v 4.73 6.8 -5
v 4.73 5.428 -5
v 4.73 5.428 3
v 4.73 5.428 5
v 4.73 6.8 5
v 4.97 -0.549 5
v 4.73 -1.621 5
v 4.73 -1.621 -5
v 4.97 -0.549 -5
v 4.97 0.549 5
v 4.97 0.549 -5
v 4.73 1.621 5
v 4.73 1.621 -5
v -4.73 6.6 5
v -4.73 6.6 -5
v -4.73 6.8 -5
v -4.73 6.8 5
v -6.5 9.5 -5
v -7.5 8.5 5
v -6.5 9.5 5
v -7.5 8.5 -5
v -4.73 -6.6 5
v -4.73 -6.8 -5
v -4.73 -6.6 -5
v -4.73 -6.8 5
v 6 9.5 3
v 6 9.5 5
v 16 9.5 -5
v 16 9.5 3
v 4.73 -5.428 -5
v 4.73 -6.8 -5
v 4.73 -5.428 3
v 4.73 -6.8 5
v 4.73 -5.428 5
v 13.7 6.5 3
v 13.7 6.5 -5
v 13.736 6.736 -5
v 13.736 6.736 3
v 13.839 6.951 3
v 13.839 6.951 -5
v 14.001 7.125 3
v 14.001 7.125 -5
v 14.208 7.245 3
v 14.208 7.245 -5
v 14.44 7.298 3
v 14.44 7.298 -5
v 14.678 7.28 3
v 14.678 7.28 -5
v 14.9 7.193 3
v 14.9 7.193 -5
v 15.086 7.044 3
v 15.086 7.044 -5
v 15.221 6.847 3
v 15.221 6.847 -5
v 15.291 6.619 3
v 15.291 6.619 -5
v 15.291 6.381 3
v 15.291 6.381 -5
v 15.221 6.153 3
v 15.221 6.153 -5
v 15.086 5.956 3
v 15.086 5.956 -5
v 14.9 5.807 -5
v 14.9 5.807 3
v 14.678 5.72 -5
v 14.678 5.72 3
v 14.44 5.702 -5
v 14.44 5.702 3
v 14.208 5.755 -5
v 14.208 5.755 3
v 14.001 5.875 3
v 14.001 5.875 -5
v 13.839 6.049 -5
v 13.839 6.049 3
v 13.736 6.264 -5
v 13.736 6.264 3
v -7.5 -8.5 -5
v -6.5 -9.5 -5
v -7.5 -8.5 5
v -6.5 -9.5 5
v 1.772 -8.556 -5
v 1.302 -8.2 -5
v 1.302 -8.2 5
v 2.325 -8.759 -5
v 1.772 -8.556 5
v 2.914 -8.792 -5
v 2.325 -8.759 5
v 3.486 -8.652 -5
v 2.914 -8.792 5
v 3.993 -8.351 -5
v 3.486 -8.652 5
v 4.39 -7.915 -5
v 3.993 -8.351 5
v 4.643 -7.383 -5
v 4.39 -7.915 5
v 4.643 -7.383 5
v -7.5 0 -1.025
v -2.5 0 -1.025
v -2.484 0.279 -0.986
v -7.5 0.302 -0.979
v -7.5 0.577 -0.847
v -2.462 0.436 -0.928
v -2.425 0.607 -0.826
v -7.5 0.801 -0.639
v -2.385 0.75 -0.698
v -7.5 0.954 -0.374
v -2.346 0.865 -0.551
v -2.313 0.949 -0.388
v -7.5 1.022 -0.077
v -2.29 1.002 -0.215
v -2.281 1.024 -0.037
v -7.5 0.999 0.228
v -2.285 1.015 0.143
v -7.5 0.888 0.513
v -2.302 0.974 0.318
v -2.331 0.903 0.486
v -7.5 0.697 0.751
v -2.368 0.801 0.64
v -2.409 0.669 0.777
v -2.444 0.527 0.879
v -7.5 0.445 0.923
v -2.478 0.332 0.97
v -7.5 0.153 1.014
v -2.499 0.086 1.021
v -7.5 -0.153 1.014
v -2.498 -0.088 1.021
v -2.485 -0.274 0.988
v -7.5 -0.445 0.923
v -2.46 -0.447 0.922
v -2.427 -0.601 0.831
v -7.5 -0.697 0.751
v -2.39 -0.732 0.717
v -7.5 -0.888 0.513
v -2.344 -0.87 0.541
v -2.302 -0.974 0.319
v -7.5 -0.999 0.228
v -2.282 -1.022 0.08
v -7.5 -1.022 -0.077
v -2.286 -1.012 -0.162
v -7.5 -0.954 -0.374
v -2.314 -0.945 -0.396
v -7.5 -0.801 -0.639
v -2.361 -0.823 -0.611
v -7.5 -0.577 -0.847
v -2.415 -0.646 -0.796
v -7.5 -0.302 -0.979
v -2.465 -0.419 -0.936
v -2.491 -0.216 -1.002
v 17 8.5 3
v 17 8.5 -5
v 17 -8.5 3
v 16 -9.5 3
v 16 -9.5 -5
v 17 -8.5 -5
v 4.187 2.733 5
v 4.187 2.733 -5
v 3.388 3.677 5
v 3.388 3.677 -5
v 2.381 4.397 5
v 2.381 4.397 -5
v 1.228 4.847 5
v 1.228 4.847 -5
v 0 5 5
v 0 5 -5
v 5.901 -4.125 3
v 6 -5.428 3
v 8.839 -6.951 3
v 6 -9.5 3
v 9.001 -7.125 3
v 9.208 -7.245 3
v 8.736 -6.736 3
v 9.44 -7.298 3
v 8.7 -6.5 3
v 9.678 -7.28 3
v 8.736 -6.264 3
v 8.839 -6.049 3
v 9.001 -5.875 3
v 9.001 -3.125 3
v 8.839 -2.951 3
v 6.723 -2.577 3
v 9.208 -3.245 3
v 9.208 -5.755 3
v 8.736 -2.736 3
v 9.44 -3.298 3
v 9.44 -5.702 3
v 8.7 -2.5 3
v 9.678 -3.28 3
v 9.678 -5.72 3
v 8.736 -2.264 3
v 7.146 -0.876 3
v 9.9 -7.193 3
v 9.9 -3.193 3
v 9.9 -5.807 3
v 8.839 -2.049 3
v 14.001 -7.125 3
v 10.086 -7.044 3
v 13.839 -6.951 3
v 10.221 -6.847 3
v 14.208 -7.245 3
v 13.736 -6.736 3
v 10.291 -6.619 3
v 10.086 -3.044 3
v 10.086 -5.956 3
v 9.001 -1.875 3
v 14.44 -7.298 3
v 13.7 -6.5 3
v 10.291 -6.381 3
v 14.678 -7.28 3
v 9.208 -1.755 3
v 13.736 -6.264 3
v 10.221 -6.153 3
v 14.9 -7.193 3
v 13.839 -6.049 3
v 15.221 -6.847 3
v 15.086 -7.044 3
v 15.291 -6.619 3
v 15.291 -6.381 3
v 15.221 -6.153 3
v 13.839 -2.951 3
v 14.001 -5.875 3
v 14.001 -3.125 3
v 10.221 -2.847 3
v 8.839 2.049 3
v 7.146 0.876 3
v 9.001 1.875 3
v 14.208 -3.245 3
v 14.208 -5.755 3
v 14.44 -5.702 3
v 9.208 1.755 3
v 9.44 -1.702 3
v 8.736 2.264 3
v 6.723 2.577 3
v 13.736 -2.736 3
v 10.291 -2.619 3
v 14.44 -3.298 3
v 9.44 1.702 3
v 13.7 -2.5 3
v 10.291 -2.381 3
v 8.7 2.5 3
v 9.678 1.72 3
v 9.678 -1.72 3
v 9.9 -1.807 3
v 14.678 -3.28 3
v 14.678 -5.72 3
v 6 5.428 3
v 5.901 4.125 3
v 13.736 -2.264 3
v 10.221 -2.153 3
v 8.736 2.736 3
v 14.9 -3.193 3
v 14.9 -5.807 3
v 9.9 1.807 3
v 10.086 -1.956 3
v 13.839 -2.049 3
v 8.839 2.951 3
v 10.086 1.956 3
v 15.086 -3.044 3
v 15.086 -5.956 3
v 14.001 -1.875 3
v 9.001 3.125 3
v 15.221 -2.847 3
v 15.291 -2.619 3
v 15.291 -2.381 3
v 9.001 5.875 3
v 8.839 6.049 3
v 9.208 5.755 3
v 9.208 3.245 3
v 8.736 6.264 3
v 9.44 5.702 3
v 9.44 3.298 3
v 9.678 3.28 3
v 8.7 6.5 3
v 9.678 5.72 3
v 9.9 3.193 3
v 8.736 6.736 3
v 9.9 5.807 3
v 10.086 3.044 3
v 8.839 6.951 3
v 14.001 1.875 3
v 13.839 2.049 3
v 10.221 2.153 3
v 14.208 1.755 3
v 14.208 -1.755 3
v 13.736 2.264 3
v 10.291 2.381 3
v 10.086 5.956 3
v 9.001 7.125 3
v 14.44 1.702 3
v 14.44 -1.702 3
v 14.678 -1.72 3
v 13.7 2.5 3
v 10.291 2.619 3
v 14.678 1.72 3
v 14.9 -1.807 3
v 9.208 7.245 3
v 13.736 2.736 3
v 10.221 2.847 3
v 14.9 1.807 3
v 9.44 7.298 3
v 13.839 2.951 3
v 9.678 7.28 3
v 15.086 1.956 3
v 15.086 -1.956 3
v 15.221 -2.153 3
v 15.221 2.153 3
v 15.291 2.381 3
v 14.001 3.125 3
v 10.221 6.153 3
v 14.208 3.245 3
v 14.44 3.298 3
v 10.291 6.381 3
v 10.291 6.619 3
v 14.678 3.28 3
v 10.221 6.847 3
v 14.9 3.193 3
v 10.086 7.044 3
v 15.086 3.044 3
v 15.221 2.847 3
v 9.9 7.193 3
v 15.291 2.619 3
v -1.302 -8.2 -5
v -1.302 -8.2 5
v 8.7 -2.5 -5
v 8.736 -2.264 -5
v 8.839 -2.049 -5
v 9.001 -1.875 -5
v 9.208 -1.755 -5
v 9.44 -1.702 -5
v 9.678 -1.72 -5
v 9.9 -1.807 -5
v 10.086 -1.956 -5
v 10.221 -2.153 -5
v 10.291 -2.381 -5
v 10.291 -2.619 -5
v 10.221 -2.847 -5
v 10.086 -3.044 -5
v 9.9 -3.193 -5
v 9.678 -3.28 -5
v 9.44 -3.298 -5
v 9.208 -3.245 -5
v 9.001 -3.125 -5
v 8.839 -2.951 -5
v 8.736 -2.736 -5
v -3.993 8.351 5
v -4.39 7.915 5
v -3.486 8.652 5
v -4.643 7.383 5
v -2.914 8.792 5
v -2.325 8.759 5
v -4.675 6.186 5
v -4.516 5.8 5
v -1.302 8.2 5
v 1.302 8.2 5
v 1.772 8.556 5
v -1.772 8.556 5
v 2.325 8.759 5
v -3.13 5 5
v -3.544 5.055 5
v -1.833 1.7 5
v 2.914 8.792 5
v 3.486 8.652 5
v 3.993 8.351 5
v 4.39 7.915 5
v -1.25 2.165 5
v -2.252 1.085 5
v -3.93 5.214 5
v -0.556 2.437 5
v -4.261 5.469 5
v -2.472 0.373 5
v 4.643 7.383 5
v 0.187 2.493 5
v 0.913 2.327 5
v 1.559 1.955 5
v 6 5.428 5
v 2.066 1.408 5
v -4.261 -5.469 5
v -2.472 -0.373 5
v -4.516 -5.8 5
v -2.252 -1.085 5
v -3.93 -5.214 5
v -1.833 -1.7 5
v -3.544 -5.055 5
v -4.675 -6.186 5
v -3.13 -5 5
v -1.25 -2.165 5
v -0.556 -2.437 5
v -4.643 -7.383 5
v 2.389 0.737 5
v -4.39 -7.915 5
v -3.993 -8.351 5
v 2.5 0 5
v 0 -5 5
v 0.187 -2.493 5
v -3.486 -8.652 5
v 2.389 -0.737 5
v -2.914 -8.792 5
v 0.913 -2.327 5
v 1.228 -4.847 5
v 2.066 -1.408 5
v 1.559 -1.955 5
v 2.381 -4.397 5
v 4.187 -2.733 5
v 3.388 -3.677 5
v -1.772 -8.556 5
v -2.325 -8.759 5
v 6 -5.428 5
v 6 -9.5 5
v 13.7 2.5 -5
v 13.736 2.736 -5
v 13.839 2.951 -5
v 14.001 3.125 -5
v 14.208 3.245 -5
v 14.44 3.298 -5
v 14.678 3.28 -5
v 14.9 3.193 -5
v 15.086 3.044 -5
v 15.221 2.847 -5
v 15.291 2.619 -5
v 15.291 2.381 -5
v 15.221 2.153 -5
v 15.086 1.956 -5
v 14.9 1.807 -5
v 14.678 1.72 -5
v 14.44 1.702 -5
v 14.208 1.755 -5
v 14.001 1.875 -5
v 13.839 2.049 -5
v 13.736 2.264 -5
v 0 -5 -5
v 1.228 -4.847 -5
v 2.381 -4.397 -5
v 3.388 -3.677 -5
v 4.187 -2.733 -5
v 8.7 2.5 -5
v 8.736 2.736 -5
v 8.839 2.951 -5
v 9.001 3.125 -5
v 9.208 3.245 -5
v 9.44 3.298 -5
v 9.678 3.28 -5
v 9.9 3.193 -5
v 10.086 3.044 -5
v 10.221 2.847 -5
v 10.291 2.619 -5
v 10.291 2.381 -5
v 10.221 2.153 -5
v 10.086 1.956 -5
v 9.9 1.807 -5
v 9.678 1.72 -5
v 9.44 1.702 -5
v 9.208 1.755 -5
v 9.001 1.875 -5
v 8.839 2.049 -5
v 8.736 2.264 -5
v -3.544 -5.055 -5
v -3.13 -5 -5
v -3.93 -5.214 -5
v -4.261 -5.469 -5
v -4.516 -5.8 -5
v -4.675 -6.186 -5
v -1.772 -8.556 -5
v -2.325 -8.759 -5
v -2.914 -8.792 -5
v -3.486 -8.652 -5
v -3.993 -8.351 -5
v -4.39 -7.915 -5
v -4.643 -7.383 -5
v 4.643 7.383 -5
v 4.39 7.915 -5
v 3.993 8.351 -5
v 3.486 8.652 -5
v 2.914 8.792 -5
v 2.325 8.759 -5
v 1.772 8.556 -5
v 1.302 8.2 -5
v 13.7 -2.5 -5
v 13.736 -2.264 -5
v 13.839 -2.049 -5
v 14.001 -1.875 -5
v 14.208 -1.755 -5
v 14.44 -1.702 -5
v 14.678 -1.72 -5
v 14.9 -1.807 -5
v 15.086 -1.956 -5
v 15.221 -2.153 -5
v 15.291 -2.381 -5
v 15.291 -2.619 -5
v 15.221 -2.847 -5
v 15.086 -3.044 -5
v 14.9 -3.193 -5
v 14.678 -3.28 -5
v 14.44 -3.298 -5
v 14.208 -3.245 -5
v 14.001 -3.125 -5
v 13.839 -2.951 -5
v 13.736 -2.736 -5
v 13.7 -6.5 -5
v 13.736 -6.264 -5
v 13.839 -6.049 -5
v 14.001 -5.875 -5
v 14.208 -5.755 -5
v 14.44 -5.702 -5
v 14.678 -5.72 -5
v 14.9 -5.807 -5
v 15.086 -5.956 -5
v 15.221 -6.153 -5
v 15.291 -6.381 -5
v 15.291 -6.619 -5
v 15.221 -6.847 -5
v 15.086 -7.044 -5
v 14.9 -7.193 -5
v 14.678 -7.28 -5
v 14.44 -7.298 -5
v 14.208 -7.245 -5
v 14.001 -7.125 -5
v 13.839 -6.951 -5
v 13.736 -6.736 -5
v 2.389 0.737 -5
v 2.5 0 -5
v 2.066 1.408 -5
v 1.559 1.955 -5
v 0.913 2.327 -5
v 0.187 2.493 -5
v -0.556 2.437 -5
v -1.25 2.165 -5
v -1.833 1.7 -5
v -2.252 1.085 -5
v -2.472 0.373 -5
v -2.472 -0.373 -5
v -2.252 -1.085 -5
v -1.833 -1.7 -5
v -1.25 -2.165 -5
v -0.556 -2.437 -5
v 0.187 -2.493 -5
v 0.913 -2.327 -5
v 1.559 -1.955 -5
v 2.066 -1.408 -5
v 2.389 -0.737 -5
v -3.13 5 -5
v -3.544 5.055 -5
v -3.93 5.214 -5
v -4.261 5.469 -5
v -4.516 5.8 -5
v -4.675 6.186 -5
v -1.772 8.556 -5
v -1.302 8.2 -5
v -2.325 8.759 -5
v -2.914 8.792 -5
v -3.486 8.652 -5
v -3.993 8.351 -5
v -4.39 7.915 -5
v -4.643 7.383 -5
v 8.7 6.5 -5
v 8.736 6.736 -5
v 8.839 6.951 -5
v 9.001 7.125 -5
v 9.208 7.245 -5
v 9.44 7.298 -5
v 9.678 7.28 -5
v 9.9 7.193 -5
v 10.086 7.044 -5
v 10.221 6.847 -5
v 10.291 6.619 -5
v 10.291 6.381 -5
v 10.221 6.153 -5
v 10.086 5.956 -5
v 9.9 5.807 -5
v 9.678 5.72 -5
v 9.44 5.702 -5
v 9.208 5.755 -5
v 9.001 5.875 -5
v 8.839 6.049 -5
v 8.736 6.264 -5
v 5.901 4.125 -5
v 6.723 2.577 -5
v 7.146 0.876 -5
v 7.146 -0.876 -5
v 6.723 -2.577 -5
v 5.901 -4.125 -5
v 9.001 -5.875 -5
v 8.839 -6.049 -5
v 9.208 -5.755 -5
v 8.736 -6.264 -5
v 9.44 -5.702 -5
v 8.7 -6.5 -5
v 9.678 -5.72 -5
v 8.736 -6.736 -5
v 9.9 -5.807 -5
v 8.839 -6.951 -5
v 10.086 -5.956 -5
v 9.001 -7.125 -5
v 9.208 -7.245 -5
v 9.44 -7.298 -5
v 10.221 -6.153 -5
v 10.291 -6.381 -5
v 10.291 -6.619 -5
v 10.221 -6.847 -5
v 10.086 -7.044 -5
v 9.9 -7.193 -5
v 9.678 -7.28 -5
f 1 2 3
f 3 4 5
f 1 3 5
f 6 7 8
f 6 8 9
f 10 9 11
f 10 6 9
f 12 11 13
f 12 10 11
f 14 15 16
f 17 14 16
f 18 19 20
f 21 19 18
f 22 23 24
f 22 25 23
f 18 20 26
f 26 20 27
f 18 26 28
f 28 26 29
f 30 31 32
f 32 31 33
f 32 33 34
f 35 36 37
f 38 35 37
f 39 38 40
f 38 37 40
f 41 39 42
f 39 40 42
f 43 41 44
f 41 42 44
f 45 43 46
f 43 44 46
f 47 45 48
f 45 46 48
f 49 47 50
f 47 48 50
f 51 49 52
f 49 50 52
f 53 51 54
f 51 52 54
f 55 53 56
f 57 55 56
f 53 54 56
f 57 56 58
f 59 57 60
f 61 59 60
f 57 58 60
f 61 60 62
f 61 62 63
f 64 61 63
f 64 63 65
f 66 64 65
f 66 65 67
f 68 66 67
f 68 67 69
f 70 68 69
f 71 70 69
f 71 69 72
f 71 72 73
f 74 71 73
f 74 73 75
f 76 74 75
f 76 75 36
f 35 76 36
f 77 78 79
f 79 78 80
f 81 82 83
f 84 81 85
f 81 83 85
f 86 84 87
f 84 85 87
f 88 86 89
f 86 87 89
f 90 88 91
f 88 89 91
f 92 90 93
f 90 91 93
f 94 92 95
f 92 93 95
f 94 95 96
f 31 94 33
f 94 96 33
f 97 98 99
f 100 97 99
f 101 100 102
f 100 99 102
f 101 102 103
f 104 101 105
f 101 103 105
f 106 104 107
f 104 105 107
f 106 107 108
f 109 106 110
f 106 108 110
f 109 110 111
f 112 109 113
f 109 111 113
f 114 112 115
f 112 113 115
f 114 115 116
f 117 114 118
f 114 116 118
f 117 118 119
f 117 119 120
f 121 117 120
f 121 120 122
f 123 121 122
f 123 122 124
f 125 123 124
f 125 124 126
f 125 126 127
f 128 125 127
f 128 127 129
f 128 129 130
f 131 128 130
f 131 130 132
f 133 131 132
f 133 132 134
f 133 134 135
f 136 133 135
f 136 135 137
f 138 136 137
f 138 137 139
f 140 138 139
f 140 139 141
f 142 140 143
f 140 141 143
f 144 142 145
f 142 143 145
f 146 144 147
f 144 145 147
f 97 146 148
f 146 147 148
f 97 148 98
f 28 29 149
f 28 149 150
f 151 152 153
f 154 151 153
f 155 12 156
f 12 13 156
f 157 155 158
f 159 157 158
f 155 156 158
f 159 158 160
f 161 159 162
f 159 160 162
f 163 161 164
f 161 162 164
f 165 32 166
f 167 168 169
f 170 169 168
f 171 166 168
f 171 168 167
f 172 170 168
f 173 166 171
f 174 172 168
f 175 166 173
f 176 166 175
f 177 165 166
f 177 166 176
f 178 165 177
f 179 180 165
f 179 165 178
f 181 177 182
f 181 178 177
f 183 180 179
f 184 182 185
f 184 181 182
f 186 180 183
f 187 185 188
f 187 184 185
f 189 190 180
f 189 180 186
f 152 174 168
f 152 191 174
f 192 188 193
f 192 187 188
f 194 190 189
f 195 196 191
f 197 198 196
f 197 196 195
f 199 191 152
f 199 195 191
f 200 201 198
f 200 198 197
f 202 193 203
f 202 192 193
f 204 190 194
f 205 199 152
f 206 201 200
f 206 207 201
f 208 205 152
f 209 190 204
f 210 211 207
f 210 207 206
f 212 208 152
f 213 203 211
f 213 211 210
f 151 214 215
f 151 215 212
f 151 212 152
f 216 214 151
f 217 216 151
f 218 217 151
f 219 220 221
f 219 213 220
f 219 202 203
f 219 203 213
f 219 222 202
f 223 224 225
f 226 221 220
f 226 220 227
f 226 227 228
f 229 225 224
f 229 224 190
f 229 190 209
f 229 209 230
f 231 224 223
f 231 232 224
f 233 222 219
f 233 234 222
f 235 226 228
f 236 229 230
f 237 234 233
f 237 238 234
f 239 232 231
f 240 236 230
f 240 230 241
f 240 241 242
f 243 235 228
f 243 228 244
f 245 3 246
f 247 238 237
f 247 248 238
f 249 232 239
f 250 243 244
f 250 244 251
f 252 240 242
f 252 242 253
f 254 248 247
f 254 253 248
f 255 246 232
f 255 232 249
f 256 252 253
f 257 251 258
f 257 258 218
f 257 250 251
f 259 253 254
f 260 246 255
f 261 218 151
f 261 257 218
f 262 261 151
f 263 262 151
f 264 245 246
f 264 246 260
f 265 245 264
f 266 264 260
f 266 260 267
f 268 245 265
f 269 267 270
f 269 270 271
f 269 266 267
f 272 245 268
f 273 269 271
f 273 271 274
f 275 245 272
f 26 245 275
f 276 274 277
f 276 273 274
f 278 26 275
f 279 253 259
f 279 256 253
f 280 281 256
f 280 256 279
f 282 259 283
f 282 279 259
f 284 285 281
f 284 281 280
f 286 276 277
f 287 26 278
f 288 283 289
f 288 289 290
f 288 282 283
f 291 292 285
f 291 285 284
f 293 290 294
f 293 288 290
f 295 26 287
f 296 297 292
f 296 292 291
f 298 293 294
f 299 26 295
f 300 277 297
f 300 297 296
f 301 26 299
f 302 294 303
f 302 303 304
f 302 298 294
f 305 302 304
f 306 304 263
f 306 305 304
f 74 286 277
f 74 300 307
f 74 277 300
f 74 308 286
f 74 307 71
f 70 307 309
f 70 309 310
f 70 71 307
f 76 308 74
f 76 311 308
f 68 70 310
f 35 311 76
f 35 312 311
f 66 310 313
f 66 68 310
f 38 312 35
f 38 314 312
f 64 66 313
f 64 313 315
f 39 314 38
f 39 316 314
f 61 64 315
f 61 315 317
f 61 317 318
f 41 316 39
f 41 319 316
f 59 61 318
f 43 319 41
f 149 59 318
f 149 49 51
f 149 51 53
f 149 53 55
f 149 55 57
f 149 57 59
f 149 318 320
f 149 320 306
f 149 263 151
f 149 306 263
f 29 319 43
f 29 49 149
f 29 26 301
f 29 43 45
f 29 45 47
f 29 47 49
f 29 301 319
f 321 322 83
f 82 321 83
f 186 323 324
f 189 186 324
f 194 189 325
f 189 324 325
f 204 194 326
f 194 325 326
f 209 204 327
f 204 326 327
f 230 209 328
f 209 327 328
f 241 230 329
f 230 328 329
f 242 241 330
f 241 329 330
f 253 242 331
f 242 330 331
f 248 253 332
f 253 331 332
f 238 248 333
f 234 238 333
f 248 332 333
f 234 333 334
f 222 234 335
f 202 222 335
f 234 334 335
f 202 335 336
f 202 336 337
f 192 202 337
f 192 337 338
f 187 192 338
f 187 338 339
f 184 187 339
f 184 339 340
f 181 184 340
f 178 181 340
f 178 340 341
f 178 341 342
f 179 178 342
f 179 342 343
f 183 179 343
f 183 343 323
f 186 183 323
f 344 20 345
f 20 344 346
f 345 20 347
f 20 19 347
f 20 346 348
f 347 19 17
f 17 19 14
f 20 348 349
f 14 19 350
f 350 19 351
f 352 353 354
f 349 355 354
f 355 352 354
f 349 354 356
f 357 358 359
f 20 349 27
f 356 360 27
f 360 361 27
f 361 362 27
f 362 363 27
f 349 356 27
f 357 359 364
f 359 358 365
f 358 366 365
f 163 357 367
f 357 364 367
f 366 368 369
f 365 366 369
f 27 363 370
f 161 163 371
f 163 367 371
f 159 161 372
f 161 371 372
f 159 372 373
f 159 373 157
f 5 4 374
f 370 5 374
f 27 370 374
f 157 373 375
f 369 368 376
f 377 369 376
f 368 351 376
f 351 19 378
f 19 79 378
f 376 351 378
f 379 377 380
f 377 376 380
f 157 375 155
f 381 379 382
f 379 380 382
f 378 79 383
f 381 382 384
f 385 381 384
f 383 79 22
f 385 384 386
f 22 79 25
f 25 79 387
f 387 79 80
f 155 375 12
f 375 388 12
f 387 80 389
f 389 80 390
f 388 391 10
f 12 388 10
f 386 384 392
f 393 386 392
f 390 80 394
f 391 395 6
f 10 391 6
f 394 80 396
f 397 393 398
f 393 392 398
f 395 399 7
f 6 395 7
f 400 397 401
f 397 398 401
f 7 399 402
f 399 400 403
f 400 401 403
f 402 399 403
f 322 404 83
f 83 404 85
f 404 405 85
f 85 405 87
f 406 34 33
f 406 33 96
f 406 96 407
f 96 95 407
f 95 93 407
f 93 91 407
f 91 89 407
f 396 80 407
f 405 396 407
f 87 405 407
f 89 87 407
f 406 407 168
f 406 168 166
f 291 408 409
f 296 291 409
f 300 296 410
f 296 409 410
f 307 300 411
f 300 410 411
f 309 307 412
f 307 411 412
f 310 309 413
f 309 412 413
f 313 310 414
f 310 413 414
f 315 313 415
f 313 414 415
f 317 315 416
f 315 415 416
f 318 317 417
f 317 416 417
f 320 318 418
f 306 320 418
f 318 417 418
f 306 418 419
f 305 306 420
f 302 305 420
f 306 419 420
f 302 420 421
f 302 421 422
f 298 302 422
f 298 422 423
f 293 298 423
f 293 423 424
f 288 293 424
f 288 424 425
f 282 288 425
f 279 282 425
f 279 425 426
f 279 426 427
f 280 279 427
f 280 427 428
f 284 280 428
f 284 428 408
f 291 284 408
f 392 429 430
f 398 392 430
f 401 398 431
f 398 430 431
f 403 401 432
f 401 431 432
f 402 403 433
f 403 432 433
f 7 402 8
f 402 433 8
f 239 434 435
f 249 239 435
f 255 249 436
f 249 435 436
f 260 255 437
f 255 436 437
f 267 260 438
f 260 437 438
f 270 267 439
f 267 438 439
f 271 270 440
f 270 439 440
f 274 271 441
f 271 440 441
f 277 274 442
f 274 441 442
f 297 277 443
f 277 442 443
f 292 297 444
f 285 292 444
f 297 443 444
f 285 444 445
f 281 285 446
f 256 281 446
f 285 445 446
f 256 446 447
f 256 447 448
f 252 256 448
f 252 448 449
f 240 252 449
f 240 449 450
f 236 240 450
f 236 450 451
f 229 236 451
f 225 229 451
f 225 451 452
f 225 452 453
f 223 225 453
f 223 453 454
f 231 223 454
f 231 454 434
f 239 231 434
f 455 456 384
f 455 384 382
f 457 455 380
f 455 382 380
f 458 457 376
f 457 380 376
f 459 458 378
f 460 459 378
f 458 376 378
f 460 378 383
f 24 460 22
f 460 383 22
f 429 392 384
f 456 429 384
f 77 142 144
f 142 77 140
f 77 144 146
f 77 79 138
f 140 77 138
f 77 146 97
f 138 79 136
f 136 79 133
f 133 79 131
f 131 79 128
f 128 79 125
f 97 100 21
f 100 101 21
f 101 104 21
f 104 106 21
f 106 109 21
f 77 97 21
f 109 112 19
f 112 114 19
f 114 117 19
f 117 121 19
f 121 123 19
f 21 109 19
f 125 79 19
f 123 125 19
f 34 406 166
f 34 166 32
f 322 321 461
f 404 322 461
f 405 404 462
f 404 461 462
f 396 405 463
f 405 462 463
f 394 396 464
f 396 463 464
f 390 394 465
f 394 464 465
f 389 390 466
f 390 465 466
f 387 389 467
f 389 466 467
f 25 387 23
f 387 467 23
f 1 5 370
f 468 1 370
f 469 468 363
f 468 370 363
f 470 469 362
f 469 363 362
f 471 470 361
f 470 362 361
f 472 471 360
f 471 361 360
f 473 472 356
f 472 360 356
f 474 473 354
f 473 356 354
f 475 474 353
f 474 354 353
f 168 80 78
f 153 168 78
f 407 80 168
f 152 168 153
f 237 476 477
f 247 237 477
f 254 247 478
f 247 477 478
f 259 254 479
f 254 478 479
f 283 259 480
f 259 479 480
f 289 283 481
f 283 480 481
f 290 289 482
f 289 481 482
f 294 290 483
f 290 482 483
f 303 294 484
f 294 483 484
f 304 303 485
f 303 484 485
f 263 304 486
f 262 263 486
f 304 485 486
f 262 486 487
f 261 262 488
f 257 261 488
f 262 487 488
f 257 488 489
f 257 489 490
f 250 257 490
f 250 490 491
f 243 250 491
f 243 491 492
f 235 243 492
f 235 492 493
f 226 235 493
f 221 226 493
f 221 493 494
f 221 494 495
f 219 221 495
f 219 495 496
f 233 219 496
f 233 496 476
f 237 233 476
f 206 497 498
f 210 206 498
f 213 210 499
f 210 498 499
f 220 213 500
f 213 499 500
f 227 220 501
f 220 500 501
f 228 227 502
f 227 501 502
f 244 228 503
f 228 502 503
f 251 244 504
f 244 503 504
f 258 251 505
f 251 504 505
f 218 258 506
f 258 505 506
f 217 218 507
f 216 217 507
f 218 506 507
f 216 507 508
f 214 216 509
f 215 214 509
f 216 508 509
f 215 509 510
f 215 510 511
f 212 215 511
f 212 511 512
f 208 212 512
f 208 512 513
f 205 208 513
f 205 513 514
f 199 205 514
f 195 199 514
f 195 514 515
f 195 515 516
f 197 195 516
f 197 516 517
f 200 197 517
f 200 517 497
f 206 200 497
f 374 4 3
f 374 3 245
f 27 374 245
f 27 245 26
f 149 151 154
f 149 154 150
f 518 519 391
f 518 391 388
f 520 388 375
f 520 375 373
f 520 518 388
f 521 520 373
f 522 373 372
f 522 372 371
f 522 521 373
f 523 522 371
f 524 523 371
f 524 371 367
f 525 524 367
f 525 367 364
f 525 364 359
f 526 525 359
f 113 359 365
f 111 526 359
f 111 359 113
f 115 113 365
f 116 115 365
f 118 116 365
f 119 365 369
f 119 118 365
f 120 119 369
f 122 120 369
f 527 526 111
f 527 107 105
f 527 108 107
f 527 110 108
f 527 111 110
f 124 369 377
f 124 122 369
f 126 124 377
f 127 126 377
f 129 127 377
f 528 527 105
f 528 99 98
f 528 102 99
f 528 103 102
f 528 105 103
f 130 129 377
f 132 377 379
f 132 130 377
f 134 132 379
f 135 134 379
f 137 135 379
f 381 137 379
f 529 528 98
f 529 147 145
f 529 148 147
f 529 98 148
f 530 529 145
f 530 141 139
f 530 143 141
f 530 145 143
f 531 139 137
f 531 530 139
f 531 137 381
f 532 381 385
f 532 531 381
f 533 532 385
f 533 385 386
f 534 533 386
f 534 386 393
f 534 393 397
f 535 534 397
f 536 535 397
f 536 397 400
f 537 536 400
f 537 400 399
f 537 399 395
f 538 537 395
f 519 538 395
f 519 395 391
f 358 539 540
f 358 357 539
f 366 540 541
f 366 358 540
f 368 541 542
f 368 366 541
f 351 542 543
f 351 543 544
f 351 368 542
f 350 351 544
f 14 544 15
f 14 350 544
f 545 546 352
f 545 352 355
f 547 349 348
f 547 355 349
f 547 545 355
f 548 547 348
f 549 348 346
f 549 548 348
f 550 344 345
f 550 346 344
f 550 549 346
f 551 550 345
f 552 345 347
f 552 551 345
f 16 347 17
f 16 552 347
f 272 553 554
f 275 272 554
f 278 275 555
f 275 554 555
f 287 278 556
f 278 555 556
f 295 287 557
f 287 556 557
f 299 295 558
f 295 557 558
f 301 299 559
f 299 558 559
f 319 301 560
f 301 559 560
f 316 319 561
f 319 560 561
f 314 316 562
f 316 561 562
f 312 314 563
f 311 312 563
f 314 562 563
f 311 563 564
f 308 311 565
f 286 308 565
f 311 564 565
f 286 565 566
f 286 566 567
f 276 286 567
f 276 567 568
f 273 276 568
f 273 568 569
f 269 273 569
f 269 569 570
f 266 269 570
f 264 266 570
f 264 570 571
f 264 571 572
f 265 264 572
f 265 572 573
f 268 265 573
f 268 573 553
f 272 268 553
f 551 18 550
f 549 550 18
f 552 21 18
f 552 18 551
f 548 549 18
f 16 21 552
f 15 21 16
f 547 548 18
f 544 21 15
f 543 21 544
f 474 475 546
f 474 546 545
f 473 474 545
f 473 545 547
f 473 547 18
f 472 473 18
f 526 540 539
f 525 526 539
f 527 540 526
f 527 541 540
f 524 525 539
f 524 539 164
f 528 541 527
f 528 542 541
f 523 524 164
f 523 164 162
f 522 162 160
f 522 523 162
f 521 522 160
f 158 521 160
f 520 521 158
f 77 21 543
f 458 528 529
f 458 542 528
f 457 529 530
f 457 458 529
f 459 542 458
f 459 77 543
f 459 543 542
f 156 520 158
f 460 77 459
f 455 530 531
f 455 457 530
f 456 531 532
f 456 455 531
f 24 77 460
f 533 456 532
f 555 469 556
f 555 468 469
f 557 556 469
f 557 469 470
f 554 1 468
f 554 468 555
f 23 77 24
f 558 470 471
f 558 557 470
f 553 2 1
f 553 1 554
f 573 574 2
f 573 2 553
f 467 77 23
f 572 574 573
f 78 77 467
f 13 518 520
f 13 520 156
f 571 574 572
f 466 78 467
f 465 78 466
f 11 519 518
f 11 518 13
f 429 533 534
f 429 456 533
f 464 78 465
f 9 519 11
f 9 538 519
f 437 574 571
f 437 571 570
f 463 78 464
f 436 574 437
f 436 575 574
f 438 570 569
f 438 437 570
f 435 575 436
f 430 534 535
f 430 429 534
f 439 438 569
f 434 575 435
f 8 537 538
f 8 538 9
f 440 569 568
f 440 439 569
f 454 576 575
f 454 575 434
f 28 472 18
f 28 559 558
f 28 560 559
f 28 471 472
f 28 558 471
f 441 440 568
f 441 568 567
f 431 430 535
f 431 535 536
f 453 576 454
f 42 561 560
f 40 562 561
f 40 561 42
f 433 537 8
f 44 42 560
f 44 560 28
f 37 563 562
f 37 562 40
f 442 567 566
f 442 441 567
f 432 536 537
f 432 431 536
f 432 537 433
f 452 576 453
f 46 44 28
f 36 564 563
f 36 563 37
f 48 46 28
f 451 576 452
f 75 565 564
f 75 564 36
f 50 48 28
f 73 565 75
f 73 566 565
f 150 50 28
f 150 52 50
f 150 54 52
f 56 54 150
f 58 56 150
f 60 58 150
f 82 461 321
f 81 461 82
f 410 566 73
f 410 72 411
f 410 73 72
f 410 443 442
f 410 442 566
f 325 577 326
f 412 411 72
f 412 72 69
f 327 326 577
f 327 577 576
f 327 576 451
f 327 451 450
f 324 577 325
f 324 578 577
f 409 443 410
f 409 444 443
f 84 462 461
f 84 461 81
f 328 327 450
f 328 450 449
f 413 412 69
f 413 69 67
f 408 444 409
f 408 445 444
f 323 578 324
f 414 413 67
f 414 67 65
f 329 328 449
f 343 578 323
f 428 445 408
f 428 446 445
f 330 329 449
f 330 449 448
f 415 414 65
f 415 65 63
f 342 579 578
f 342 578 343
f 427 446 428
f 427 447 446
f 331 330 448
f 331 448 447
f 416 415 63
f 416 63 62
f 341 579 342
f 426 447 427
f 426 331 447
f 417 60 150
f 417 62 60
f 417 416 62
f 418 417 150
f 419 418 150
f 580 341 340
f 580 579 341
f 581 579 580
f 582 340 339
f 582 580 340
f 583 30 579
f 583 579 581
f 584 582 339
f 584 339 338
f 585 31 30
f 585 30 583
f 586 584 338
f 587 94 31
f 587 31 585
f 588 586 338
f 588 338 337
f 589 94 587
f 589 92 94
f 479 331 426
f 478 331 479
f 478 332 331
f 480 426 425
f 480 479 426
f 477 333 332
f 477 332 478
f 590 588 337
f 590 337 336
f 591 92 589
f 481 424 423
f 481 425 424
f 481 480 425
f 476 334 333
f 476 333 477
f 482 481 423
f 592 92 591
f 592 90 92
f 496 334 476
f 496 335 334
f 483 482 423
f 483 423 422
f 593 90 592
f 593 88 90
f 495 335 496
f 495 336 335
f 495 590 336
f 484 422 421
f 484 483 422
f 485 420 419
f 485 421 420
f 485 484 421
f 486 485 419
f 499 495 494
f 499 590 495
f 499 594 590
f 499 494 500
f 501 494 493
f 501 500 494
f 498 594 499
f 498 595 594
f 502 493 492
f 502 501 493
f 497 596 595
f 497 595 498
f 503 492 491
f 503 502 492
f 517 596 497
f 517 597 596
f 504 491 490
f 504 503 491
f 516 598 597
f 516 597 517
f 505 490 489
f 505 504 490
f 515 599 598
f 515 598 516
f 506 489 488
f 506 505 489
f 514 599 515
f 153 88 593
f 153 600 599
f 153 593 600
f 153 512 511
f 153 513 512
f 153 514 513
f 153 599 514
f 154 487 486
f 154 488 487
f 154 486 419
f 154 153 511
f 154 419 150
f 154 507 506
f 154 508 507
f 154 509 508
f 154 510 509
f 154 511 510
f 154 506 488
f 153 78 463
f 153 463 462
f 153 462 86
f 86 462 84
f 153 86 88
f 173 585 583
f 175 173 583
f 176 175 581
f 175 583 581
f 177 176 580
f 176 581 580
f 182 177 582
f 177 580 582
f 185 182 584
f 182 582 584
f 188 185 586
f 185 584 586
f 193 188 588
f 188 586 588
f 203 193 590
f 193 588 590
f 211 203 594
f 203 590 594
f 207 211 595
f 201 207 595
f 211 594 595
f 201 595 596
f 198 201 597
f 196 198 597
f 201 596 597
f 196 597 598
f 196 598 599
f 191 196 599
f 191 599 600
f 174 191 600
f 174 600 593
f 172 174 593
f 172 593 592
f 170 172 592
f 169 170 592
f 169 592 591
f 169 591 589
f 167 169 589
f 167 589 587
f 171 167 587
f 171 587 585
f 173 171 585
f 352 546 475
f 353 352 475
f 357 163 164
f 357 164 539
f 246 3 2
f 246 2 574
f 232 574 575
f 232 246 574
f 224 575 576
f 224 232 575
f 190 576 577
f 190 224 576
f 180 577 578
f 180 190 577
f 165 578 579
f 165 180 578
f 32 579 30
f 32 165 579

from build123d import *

# Parameters (mm, degrees)
SKETCH1_W                = 15
SKETCH1_H                = 19
BOSS_EXTRUDE1_DEPTH      = 5
BOSS_EXTRUDE1_DEPTH_BACK = 5
CUT_EXTRUDE1_START       = -6
SKETCH2_R                = 2
CUT_EXTRUDE1_DEPTH       = 16
SKETCH5_R                = 2
CUT_EXTRUDE4_DEPTH       = 17
CUT_EXTRUDE4_DEPTH_BACK  = 17
SKETCH6_R                = 2
CUT_EXTRUDE5_DEPTH       = 17
CUT_EXTRUDE5_DEPTH_BACK  = 17
SKETCH10_W               = 9.46
SKETCH10_H               = 13.6
CUT_EXTRUDE6_DEPTH       = 6
CUT_EXTRUDE6_DEPTH_BACK  = 6
BOSS_EXTRUDE2_START      = -5
SKETCH7_R                = 5
SKETCH7_R_2              = 2.5
BOSS_EXTRUDE2_DEPTH      = 10
BOSS_EXTRUDE3_DEPTH      = 5
FILLET1_R                = 1.6
SKETCH11_W               = 12.27
SKETCH11_H               = 19
BOSS_EXTRUDE4_DEPTH      = 10
CHAMFER1_SIZE            = 1
SKETCH16_W               = 5.80562201
SKETCH16_H               = 3.2
CUT_EXTRUDE8_DEPTH       = 11.5
CUT_EXTRUDE9_DEPTH       = 11.5
TROU_TARAUD_M21_D        = 1.6
SKETCH24_W               = 11
SKETCH24_H               = 19
CUT_EXTRUDE10_DEPTH      = 2
CUT_EXTRUDE11_DEPTH      = 2
TROU_TARAUD_M2_51_D      = 2.05
TROU_TARAUD_M2_51_DEPTH  = 8.25
TROU_TARAUD_M2_51_TIP    = 0.615882135


with BuildPart() as part:
    # Sketch1 → Boss-Extrude1 (new body, two sides)
    with BuildSketch(Plane.XY) as boss_extrude1_sk:
        Rectangle(SKETCH1_W, SKETCH1_H)
    extrude(amount=BOSS_EXTRUDE1_DEPTH)
    extrude(boss_extrude1_sk.sketch, amount=-BOSS_EXTRUDE1_DEPTH_BACK)

    # Sketch2 → Cut-Extrude1 (cut)
    with BuildSketch(Plane.XY.offset(CUT_EXTRUDE1_START)):
        with Locations((-2.73, 6.8)):
            Circle(SKETCH2_R)
    cut_extrude1 = extrude(amount=CUT_EXTRUDE1_DEPTH, mode=Mode.SUBTRACT)

    # Mirror3: Cut-Extrude1 across plane
    add(cut_extrude1.mirror(Plane.ZX), mode=Mode.SUBTRACT)

    # Sketch5 → Cut-Extrude4 (cut, two sides)
    with BuildSketch(Plane.XY) as cut_extrude4_sk:
        with Locations((2.73, 6.8)):
            Circle(SKETCH5_R)
    extrude(amount=CUT_EXTRUDE4_DEPTH, mode=Mode.SUBTRACT)
    extrude(cut_extrude4_sk.sketch, amount=-CUT_EXTRUDE4_DEPTH_BACK, mode=Mode.SUBTRACT)

    # Sketch6 → Cut-Extrude5 (cut, two sides)
    with BuildSketch(Plane.XY) as cut_extrude5_sk:
        with Locations((2.73, -6.8)):
            Circle(SKETCH6_R)
    extrude(amount=CUT_EXTRUDE5_DEPTH, mode=Mode.SUBTRACT)
    extrude(cut_extrude5_sk.sketch, amount=-CUT_EXTRUDE5_DEPTH_BACK, mode=Mode.SUBTRACT)

    # Sketch10 → Cut-Extrude6 (cut, two sides)
    with BuildSketch(Plane.XY) as cut_extrude6_sk:
        Rectangle(SKETCH10_W, SKETCH10_H)
    extrude(amount=CUT_EXTRUDE6_DEPTH, mode=Mode.SUBTRACT)
    extrude(cut_extrude6_sk.sketch, amount=-CUT_EXTRUDE6_DEPTH_BACK, mode=Mode.SUBTRACT)



with BuildPart() as body_2:
    # Sketch7 → Boss-Extrude2 (new body)
    with BuildSketch(Plane.XY.offset(BOSS_EXTRUDE2_START)):
        Circle(SKETCH7_R)
        Circle(SKETCH7_R_2, mode=Mode.SUBTRACT)
    extrude(amount=BOSS_EXTRUDE2_DEPTH)


with BuildPart() as part_1:
    add(part.part)

    add(body_2.part)  # Boss-Extrude3 merges body 2
    # Sketch8 → Boss-Extrude3 (add, symmetric)
    with BuildSketch(Plane.XY):
        Polygon((0, 5), (-7.5, 5), (-7.5, 0), (-5, 0), align=None)
    boss_extrude3 = extrude(amount=BOSS_EXTRUDE3_DEPTH, both=True)

    # Mirror7: Boss-Extrude3 across plane
    add(boss_extrude3.mirror(Plane.ZX))

    # Fillet1
    fillet1_edges = [part_1.edges().sort_by_distance(p)[0] for p in [
        (-4.73, -5, 0),
        (-4.73, 5, 0),
    ]]
    fillet(fillet1_edges, radius=FILLET1_R)

    # Sketch11 → Boss-Extrude4 (add)
    with BuildSketch(Plane.XY.offset(5)):
        with Locations((10.865, 0)):
            Rectangle(SKETCH11_W, SKETCH11_H)
    extrude(amount=-BOSS_EXTRUDE4_DEPTH)

    # Chamfer1
    chamfer1_edges = [part_1.edges().sort_by_distance(p)[0] for p in [
        (17, 9.5, 0),
        (17, -9.5, 0),
        (-7.5, 9.5, 0),
        (-7.5, -9.5, 0),
    ]]
    chamfer(chamfer1_edges, length=CHAMFER1_SIZE)

    # Sketch16 → Cut-Extrude8 (cut)
    with BuildSketch(Plane.XY.offset(5)):
        with Locations((-0.227188995, 6.6)):
            Rectangle(SKETCH16_W, SKETCH16_H)
    cut_extrude8 = extrude(amount=-CUT_EXTRUDE8_DEPTH, mode=Mode.SUBTRACT)

    # Mirror8: Cut-Extrude8 across plane
    add(cut_extrude8.mirror(Plane.ZX), mode=Mode.SUBTRACT)

    # Sketch17 → Cut-Extrude9 (cut)
    with BuildSketch(Plane.XY.offset(5)):
        with BuildLine():
            ThreePointArc((2.678170763, -4.222250746), (5, 0), (2.678170763, 4.222250746))
            ThreePointArc((2.678170763, 4.222250746), (2.338473166, 5.740343478), (3.856565898, 6.080041075))
            ThreePointArc((3.856565898, 6.080041075), (7.2, 0), (3.856565898, -6.080041075))
            ThreePointArc((3.856565898, -6.080041075), (2.338473166, -5.740343478), (2.678170763, -4.222250746))
        make_face()
    extrude(amount=-CUT_EXTRUDE9_DEPTH, mode=Mode.SUBTRACT)

    # Trou taraudé M21 (through all)
    with Locations(Plane.XY.offset(5)):
        with Locations((14.5, 6.5), (14.5, -6.5), (9.5, 6.5), (9.5, -6.5), (9.5, 2.5), (14.5, 2.5), (14.5, -2.5), (9.5, -2.5)):
            Hole(TROU_TARAUD_M21_D / 2)

    # Sketch24 → Cut-Extrude10 (cut)
    with BuildSketch(Plane.XY.offset(5)):
        with Locations((11.5, 0)):
            Rectangle(SKETCH24_W, SKETCH24_H)
    extrude(amount=-CUT_EXTRUDE10_DEPTH, mode=Mode.SUBTRACT)

    # Sketch25 → Cut-Extrude11 (cut)
    with BuildSketch(Plane.XY.offset(5)):
        Polygon((17, -5.42836071), (4.73, -5.42836071), (6.865, 0), (4.73, 5.42836071), (17, 5.42836071), align=None)
    extrude(amount=-CUT_EXTRUDE11_DEPTH, mode=Mode.SUBTRACT)

    # Trou taraudé M2.51
    with Locations(Plane.ZY.offset(7.5)):
        with Locations((0, 0)):
            Hole(TROU_TARAUD_M2_51_D / 2, depth=TROU_TARAUD_M2_51_DEPTH)
            with Locations((0, 0, -(TROU_TARAUD_M2_51_DEPTH + TROU_TARAUD_M2_51_TIP / 2))):  # 118° drill point
                Cone(0, TROU_TARAUD_M2_51_D / 2, TROU_TARAUD_M2_51_TIP, mode=Mode.SUBTRACT)


solid = part_1.part
